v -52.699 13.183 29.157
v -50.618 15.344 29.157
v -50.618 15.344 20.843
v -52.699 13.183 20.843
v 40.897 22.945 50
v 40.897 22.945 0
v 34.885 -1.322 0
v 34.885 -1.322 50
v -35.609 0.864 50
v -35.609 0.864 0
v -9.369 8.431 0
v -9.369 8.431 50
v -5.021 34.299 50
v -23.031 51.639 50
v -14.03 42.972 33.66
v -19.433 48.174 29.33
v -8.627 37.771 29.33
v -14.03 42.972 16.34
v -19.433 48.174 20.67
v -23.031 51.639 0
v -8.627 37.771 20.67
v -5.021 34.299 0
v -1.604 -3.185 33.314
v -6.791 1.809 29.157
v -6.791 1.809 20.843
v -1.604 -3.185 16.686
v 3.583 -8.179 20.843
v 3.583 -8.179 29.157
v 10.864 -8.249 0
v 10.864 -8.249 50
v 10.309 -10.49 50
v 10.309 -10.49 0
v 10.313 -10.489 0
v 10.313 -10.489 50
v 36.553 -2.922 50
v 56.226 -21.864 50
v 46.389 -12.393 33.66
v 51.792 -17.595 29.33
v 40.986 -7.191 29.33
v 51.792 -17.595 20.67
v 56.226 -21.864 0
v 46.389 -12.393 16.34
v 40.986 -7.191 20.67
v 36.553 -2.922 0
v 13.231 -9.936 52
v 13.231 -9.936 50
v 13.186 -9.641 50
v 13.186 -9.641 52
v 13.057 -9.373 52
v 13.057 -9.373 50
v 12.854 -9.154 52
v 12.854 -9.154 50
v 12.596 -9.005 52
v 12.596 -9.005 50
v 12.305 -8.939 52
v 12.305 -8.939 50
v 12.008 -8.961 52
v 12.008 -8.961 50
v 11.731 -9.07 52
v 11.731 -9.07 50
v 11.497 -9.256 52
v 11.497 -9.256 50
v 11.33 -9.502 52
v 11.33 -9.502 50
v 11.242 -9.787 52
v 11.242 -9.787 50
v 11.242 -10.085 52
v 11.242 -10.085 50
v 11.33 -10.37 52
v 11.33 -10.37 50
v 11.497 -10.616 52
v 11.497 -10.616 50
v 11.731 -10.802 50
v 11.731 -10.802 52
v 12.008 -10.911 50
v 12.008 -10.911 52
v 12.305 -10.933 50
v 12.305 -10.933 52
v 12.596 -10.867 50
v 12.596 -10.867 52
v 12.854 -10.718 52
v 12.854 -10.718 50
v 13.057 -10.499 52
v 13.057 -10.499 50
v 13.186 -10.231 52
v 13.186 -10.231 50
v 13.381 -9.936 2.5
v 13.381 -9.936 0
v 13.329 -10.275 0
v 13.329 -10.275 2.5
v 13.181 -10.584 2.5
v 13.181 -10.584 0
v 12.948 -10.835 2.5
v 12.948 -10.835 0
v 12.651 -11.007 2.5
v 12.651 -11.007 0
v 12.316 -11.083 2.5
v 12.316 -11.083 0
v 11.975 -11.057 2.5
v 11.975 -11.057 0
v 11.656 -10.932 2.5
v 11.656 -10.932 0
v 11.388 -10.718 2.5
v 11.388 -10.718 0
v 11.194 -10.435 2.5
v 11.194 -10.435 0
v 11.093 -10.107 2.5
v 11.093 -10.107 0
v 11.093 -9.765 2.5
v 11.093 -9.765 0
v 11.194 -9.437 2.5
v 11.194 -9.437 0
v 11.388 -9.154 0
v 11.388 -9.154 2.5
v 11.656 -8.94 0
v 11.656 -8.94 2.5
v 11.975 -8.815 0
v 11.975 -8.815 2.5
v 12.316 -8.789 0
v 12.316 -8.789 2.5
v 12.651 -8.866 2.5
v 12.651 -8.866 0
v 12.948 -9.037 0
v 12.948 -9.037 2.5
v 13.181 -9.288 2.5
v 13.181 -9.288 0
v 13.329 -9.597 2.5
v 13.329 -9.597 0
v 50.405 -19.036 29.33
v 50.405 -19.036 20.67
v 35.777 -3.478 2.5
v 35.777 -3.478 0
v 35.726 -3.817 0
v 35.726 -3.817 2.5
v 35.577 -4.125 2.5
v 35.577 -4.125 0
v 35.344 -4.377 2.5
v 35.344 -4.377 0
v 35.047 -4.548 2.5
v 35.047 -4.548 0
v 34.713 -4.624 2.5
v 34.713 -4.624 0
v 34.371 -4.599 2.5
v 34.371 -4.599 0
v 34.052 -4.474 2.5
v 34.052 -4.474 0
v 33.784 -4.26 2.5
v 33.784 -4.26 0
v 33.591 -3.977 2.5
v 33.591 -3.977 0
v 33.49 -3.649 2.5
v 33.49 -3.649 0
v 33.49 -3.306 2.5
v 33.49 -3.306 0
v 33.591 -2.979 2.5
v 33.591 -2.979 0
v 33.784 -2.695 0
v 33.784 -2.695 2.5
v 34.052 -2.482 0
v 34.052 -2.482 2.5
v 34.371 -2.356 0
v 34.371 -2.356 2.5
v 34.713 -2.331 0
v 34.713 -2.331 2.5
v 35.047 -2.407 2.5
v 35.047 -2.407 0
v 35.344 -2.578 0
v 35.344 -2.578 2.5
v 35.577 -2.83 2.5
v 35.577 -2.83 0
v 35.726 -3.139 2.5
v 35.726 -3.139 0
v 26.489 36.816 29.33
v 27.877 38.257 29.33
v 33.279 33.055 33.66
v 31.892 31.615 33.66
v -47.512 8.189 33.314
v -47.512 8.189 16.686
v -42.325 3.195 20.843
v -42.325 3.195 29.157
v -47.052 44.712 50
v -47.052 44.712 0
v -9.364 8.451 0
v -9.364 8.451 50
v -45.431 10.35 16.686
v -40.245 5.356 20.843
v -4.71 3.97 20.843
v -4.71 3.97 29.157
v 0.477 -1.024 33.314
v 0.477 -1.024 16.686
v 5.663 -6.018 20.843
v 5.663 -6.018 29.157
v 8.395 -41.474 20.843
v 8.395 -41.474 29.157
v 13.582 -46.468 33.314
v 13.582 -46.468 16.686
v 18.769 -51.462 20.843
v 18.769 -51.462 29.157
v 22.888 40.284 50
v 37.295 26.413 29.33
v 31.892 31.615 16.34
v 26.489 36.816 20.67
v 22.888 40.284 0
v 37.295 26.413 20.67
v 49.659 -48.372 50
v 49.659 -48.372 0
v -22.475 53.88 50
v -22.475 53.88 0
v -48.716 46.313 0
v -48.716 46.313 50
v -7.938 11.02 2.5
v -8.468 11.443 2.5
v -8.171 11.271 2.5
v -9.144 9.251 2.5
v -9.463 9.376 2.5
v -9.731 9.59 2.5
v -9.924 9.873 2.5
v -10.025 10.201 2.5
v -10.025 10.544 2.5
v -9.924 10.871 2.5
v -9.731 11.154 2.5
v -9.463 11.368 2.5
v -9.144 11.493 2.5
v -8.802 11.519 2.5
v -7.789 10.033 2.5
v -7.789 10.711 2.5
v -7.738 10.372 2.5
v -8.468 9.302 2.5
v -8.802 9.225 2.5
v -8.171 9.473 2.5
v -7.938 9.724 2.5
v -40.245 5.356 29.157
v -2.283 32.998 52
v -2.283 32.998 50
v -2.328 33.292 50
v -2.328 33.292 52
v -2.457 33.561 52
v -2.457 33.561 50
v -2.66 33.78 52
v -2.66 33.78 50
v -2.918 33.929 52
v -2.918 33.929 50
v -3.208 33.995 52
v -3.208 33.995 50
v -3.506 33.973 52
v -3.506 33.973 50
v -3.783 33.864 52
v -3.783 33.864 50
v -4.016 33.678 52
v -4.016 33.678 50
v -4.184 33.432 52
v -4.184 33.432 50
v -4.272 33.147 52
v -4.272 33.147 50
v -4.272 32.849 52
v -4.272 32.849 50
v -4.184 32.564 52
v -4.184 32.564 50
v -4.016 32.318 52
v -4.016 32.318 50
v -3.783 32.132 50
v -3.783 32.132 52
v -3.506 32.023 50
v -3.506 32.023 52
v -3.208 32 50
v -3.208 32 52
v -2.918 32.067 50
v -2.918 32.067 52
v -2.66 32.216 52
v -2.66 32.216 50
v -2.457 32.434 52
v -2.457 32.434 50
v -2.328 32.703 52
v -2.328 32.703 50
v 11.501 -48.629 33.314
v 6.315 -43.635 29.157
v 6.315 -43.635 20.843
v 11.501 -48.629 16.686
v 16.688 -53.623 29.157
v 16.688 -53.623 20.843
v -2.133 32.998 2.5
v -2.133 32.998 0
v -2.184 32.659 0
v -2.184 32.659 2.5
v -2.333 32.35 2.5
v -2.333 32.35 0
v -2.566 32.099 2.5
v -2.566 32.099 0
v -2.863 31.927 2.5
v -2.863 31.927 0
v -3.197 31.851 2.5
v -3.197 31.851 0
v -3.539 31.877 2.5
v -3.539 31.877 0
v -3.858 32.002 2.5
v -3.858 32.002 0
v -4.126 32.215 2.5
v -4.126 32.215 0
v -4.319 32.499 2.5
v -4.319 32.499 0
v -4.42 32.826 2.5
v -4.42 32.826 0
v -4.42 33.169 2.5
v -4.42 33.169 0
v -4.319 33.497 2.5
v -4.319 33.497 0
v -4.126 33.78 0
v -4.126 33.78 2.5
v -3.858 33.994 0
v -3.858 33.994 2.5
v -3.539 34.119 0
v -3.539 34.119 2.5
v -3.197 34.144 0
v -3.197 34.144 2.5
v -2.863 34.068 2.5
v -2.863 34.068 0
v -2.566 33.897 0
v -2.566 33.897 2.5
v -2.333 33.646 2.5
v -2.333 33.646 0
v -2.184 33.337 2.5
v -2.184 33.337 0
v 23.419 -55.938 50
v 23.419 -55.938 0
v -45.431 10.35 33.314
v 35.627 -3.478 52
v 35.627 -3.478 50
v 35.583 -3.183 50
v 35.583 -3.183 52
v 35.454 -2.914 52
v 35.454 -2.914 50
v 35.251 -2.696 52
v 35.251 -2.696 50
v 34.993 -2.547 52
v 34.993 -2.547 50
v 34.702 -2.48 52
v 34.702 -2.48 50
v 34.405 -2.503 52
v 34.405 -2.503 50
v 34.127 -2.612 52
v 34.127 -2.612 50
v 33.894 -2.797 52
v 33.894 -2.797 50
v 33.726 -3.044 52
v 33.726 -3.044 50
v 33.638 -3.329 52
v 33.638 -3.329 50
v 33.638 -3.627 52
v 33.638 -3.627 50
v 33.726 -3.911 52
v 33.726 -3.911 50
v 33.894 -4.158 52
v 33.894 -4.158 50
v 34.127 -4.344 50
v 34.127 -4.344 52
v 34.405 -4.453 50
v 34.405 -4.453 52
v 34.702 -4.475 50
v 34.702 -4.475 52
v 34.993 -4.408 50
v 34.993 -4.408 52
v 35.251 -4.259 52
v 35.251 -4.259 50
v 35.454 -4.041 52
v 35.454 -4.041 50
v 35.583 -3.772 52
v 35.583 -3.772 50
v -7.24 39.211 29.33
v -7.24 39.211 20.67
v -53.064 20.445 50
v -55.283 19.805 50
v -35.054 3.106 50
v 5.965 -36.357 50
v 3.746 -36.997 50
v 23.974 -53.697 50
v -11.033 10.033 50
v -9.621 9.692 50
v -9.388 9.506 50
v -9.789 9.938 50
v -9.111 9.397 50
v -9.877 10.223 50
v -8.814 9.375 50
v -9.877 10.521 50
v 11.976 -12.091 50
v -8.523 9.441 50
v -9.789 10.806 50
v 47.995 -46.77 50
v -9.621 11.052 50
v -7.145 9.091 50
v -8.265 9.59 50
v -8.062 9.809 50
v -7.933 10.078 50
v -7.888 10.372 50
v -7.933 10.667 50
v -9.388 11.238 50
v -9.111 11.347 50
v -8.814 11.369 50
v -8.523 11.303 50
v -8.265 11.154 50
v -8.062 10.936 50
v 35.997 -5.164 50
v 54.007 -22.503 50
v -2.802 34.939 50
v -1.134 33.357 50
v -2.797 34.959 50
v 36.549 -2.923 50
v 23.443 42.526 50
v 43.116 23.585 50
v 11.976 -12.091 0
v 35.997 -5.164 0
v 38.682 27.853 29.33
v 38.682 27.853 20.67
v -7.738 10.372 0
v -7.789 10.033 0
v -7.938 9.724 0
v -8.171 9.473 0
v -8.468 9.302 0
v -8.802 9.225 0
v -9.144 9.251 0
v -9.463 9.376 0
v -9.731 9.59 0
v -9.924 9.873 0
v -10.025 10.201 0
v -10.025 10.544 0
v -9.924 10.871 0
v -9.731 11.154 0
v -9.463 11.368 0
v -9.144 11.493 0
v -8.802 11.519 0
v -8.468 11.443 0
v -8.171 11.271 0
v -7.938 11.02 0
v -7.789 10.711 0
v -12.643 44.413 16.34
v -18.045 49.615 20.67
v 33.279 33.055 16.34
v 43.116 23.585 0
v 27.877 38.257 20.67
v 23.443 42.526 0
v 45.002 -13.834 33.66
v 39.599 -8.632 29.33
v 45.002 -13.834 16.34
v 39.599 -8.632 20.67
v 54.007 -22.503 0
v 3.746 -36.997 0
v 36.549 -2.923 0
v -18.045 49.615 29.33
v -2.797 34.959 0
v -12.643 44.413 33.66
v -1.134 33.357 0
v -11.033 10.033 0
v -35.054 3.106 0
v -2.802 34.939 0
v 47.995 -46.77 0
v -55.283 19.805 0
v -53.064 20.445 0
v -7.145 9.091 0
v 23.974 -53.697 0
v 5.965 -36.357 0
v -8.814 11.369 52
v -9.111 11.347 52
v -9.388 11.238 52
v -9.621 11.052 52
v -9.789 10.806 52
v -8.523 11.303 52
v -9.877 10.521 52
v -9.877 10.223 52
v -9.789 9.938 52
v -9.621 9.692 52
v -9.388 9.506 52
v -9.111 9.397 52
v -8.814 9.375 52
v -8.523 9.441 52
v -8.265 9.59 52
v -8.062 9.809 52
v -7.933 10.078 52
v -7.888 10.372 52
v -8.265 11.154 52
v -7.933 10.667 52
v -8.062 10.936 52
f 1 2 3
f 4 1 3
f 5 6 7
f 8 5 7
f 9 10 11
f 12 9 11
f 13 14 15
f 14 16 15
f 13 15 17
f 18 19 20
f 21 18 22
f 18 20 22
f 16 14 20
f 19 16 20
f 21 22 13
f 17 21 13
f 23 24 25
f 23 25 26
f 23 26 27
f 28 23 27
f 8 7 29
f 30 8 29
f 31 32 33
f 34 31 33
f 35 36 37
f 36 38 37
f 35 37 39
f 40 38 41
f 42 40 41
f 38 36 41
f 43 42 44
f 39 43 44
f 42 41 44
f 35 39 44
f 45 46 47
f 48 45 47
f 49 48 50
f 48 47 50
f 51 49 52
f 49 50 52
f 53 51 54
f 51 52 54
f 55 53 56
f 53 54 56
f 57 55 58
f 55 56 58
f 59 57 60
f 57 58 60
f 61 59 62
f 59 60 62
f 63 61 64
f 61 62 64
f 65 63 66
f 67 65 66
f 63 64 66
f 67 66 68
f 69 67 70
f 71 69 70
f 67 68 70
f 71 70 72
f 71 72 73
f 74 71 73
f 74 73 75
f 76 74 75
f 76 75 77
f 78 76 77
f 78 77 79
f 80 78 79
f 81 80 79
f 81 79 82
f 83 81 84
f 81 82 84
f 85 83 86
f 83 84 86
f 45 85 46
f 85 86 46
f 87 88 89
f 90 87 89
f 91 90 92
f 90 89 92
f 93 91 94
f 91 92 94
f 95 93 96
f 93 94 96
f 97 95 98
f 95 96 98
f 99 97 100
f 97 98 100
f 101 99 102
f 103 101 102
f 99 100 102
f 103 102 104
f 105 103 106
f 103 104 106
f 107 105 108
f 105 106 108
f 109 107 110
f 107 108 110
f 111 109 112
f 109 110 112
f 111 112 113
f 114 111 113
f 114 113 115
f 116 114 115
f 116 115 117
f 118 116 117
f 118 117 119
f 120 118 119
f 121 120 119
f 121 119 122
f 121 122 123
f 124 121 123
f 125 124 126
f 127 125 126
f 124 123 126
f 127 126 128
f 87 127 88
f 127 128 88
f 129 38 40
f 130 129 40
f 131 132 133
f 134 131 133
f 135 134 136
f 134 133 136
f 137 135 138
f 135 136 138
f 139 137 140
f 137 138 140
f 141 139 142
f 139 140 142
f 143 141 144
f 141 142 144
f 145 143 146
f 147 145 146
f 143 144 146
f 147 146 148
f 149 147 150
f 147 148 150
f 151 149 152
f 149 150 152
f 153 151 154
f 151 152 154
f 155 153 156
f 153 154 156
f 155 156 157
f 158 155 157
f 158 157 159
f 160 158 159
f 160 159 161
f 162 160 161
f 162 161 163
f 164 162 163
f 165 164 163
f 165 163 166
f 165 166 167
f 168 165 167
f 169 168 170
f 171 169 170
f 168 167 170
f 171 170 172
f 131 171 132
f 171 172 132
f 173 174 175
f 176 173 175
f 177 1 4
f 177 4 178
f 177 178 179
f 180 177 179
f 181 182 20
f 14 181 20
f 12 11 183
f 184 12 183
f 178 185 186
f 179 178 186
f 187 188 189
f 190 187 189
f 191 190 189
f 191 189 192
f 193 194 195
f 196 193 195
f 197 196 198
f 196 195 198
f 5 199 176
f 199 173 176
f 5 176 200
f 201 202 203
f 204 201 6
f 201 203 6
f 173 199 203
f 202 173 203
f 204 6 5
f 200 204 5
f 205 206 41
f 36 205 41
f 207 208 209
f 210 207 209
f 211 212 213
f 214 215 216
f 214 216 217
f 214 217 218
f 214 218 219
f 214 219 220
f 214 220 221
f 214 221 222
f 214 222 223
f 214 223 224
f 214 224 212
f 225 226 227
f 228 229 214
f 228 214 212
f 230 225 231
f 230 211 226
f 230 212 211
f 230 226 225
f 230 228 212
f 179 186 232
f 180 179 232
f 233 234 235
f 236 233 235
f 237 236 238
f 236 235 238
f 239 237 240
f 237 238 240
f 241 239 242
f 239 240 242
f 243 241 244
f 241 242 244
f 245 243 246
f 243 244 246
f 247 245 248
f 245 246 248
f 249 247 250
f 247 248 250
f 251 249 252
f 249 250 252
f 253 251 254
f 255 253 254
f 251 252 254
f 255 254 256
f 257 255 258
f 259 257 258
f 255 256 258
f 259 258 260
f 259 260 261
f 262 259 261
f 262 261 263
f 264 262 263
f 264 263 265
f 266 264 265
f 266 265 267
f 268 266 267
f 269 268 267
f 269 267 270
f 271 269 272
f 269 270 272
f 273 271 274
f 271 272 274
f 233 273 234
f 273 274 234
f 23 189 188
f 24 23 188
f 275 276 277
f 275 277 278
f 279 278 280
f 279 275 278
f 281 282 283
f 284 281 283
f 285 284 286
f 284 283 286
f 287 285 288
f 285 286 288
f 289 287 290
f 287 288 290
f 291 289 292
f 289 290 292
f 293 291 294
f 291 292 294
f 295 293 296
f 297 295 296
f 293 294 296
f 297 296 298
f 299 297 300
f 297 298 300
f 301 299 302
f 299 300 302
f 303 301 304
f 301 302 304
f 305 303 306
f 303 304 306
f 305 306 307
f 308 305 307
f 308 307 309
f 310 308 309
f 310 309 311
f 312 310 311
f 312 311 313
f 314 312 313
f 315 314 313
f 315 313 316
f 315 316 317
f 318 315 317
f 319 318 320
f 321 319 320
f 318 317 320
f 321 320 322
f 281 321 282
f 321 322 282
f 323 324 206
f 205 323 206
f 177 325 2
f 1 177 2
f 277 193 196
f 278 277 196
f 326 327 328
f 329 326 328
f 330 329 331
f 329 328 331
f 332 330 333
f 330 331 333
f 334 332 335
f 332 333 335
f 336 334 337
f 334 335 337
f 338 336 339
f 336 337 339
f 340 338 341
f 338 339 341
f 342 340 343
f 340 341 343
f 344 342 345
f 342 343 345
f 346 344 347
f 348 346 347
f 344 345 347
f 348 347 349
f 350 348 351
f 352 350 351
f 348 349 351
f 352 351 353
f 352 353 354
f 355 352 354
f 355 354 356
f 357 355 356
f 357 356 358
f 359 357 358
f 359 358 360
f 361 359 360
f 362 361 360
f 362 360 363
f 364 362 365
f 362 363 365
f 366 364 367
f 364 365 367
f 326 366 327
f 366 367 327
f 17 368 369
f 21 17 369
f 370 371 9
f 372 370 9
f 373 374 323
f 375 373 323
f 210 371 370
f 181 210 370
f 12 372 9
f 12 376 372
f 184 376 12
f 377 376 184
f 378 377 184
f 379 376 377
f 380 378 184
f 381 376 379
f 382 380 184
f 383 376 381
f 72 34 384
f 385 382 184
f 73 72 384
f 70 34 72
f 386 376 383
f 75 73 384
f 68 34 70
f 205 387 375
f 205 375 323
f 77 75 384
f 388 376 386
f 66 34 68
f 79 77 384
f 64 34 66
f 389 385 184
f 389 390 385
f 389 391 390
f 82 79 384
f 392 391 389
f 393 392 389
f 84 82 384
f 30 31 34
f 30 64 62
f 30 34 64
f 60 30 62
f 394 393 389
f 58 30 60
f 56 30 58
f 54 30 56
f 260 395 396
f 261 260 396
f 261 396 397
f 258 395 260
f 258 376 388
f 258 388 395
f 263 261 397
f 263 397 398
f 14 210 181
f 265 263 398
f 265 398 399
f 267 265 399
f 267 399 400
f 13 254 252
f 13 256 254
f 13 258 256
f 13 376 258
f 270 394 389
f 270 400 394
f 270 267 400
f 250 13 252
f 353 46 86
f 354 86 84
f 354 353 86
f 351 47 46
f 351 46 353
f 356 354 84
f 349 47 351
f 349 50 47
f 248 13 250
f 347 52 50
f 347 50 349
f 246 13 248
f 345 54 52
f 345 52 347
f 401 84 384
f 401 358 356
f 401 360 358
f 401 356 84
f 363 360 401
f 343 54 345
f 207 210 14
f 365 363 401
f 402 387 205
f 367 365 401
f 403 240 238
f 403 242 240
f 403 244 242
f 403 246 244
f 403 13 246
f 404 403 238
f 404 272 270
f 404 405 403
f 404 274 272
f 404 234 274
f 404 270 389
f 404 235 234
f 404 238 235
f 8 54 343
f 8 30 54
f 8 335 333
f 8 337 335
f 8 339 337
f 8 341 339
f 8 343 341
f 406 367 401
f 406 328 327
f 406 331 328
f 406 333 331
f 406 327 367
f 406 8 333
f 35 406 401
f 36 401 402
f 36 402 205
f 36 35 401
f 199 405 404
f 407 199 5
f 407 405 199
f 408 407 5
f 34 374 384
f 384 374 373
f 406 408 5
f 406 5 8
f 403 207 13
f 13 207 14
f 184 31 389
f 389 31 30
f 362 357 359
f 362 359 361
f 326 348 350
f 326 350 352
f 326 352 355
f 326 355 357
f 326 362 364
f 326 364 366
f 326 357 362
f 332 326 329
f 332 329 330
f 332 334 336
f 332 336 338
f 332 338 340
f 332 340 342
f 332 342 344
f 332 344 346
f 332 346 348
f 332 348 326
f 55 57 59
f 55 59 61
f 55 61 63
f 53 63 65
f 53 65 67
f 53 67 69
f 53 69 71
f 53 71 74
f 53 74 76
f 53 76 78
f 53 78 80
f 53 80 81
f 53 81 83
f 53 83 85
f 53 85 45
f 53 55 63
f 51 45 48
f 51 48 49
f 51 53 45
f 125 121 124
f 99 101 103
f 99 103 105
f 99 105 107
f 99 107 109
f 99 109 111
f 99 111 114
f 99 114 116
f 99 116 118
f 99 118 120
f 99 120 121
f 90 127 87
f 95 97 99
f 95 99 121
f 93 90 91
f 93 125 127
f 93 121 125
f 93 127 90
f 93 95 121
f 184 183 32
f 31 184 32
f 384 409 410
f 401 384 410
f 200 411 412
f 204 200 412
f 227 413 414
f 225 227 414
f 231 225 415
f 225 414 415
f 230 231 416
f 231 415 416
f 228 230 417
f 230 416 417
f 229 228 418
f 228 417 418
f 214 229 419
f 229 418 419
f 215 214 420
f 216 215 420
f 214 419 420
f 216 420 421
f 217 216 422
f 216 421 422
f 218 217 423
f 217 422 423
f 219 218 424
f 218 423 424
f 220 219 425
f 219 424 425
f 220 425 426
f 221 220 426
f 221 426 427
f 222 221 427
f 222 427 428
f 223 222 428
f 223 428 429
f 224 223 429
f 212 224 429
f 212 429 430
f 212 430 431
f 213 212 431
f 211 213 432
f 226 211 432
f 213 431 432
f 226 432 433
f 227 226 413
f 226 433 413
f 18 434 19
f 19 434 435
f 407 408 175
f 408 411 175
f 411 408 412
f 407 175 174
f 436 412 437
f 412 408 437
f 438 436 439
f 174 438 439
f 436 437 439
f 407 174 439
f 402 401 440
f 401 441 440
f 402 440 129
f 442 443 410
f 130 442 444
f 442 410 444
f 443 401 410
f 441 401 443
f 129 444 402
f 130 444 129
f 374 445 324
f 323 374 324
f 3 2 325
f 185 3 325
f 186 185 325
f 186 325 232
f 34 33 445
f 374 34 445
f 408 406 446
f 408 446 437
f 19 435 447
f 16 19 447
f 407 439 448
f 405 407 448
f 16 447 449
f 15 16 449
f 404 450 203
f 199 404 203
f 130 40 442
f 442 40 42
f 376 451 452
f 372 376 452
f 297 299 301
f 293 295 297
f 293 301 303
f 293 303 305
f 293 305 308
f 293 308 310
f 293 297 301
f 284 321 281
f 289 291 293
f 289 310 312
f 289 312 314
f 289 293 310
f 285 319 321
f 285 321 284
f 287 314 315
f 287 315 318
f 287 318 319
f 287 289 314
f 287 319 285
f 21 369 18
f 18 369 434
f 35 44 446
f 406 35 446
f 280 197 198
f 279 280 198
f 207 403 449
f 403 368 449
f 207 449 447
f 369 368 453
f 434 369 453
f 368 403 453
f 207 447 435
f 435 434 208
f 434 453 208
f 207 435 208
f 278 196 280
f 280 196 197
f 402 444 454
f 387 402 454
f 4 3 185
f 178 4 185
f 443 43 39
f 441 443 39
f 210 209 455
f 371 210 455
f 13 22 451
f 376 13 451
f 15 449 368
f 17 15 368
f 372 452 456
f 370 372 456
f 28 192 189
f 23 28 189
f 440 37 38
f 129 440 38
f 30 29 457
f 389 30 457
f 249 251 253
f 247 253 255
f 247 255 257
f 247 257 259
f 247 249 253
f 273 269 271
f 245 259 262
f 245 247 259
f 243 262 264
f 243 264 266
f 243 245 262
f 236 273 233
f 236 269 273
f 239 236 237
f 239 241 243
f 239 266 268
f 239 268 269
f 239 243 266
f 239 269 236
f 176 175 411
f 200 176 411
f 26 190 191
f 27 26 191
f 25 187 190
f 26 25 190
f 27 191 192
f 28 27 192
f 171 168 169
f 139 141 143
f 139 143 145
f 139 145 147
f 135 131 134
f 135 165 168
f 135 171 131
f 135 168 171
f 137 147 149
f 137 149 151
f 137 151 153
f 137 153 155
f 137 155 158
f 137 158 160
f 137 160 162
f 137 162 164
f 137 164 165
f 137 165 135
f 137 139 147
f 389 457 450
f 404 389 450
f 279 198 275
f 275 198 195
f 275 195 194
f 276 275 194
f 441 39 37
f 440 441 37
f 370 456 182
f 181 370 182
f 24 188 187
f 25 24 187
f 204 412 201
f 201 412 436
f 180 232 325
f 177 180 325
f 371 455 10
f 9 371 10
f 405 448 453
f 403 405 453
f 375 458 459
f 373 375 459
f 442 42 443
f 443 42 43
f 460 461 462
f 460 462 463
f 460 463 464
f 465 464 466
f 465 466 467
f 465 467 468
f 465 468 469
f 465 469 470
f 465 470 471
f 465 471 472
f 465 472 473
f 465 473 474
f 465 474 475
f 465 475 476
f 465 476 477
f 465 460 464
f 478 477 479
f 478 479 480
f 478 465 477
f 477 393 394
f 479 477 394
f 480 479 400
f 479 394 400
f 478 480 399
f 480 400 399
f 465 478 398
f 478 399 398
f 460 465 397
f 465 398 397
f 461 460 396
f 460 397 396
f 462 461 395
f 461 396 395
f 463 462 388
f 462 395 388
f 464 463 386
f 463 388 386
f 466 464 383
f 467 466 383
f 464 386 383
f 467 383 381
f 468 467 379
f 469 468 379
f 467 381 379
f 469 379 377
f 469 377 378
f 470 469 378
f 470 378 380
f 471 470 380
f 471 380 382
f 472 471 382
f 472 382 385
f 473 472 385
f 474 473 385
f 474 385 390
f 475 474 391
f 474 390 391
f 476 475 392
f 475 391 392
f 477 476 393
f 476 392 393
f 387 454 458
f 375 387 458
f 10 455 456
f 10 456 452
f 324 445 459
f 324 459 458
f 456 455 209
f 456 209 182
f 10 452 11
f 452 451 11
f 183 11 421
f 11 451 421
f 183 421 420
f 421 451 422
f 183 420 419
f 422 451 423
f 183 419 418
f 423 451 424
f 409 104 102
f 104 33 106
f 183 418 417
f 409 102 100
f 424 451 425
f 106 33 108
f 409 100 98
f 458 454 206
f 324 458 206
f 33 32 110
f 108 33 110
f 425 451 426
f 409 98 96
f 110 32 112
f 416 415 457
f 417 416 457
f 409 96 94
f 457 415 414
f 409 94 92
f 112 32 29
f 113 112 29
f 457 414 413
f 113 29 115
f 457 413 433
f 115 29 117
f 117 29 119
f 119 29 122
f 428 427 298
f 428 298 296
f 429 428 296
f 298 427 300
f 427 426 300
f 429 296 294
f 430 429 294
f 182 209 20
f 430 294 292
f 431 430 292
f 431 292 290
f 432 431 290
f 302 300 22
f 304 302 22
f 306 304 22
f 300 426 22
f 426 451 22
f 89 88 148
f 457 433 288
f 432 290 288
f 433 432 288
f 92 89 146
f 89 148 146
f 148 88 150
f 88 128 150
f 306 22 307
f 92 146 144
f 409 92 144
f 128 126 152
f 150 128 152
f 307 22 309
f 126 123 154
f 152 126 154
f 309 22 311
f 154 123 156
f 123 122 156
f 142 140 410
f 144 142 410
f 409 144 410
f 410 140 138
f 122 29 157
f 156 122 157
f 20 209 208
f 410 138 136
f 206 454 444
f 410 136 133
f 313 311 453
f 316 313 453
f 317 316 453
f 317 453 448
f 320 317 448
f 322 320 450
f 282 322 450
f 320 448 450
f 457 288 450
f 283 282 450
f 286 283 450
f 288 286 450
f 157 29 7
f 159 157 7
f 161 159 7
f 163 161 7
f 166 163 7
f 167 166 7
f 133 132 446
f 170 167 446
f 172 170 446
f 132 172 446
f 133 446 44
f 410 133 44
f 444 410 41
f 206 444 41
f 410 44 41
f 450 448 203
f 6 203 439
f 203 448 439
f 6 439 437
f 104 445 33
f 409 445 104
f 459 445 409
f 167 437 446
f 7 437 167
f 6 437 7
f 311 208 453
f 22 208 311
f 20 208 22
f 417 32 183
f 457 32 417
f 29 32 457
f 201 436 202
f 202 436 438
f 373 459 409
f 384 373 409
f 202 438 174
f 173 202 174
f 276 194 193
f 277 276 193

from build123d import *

# Parameters (mm, degrees)
F1_DEPTH  = 50
F3_R      = 1.15
F4_DEPTH  = 2.5
F2_R      = 1
F5_DEPTH  = 2
F8_DEPTH  = 4
F11_DEPTH = 3


with BuildPart() as f1:
    # F0 (on Top) → F1 (new body)
    with BuildSketch(Plane.XY):
        Polygon((10.3125888618, -10.489166909), (36.5490156619, -2.9234286087), (43.1160448871, 23.584636472), (23.4429017347, 42.5258831489), (-2.7972706431, 34.959064745), (-2.8022393409, 34.939008406), (-9.3642998683, 8.4509996642), (10.3088432841, -10.4902470126), align=None)
        Polygon((40.8970624139, 22.944753579), (34.8853695844, -1.3216748629), (10.8641796799, -8.2486103737), (-7.1453173951, 9.0908825573), (-1.1336245656, 33.3573109992), (22.8875653389, 40.28424651), align=None, mode=Mode.SUBTRACT)
        Polygon((-9.3692685661, 8.4309433252), (-9.3642998683, 8.4509996642), (-2.8022393409, 34.939008406), (-22.4753824933, 53.8802550828), (-48.7155548711, 46.3134366789), (-55.2825840964, 19.8053715981), (-35.6094409439, 0.8641249213), align=None)
        Polygon((-5.0212218141, 34.2991255129), (-11.0329146436, 10.032697071), (-35.0541045481, 3.1057615602), (-53.0636016231, 20.4452544912), (-47.0519087936, 44.7116829331), (-23.0307188891, 51.6386184439), align=None, mode=Mode.SUBTRACT)
        Polygon((36.5527612395, -2.9223485051), (36.5490156619, -2.9234286087), (10.3125888618, -10.489166909), (3.7455596365, -36.9972319897), (23.418702789, -55.9384786666), (49.6588751668, -48.3716602627), (56.225904392, -21.8635951819), align=None)
        Polygon((54.0069219188, -22.503478075), (47.9952290893, -46.7699065169), (23.9740391848, -53.6968420277), (5.9645421098, -36.3573490966), (11.9762349393, -12.0909206548), (35.9974248438, -5.163985144), align=None, mode=Mode.SUBTRACT)
    extrude(amount=F1_DEPTH)

    # F3 (on face) → F4 (cut)
    with BuildSketch(Plane(origin=(0, 0, 0), x_dir=(1, 0, 0), z_dir=(0, 0, -1))):
        with Locations((-8.8883331398, -10.3722576005)):
            Circle(F3_R)
        with Locations((-3.2831747672, -32.9976941306)):
            Circle(F3_R)
        with Locations((12.2305384765, 9.9360921718)):
            Circle(F3_R)
        with Locations((34.6273204695, 3.4775834496)):
            Circle(F3_R)
    extrude(amount=-F4_DEPTH, mode=Mode.SUBTRACT)

    # F2 (on face) → F5 (join)
    with BuildSketch(Plane.XY.offset(50)):
        with Locations((-3.2831747672, 32.9976941306)):
            Circle(F2_R)
        with Locations((-8.8883331398, 10.3722576005)):
            Circle(F2_R)
        with Locations((12.2305384765, -9.9360921718)):
            Circle(F2_R)
        with Locations((34.6273204695, -3.4775834496)):
            Circle(F2_R)
    extrude(amount=F5_DEPTH)

    # F6 (on face) + F7 (on face) → F8 (cut)
    with BuildSketch(Plane(origin=(32.5249435766, 33.7817189082, 0), x_dir=(-0.720379883, 0.6935797172, 0), z_dir=(0.6935797172, 0.720379883, 0))):
        Polygon((-1.0474053373, 33.6602540378), (-8.5474053373, 29.3301270189), (-8.5474053373, 20.6698729811), (-1.0474053373, 16.3397459622), (6.4525946627, 20.6698729811), (6.4525946627, 29.3301270189), align=None)
    with BuildSketch(Plane(origin=(16.1236842597, 16.7467091263, 0), x_dir=(-0.720379883, 0.6935797172, 0), z_dir=(0.6935797172, 0.720379883, 0))):
        Polygon((32.4115306178, 29.3301270189), (32.4115306178, 20.6698729811), (39.9115306178, 16.3397459622), (47.4115306178, 20.6698729811), (47.4115306178, 29.3301270189), (39.9115306178, 33.6602540378), align=None)
        Polygon((-49.5134560533, 29.3301270189), (-49.5134560533, 20.6698729811), (-42.0134560533, 16.3397459622), (-34.5134560533, 20.6698729811), (-34.5134560533, 29.3301270189), (-42.0134560533, 33.6602540378), align=None)
    extrude(amount=-F8_DEPTH, mode=Mode.SUBTRACT)


with BuildPart() as f11:
    # F10 (on face) → F11 (new body)
    with BuildSketch(Plane(origin=(-0.2822580265, -0.2931645765, 0), x_dir=(0.720379883, -0.6935797172, 0), z_dir=(-0.6935797172, -0.720379883, 0))):
        Polygon((8.2535455477, 20.8430780618), (8.2535455477, 29.1569219382), (1.0535455477, 33.3138438763), (-6.1464544523, 29.1569219382), (-6.1464544523, 20.8430780618), (1.0535455477, 16.6861561237), align=None)
    extrude(amount=F11_DEPTH)


with BuildPart() as f11b:
    # F9 (on face) → F11, piece 2 (new body)
    with BuildSketch(Plane(origin=(-16.6835173433, -17.3281743584, 0), x_dir=(0.720379883, -0.6935797172, 0), z_dir=(-0.6935797172, -0.720379883, 0))):
        Polygon((49.2134560533, 20.8430780618), (49.2134560533, 29.1569219382), (42.0134560533, 33.3138438763), (34.8134560533, 29.1569219382), (34.8134560533, 20.8430780618), (42.0134560533, 16.6861561237), align=None)
    extrude(amount=F11_DEPTH)


with BuildPart() as f11c:
    # F9 (on face) → F11, piece 3 (new body)
    with BuildSketch(Plane(origin=(-16.6835173433, -17.3281743584, 0), x_dir=(0.720379883, -0.6935797172, 0), z_dir=(-0.6935797172, -0.720379883, 0))):
        Polygon((-32.7063649578, 20.8430780618), (-32.7063649578, 29.1569219382), (-39.9063649578, 33.3138438763), (-47.1063649578, 29.1569219382), (-47.1063649578, 20.8430780618), (-39.9063649578, 16.6861561237), align=None)
    extrude(amount=F11_DEPTH)


solid = Compound([f1.part, f11.part, f11b.part, f11c.part])
